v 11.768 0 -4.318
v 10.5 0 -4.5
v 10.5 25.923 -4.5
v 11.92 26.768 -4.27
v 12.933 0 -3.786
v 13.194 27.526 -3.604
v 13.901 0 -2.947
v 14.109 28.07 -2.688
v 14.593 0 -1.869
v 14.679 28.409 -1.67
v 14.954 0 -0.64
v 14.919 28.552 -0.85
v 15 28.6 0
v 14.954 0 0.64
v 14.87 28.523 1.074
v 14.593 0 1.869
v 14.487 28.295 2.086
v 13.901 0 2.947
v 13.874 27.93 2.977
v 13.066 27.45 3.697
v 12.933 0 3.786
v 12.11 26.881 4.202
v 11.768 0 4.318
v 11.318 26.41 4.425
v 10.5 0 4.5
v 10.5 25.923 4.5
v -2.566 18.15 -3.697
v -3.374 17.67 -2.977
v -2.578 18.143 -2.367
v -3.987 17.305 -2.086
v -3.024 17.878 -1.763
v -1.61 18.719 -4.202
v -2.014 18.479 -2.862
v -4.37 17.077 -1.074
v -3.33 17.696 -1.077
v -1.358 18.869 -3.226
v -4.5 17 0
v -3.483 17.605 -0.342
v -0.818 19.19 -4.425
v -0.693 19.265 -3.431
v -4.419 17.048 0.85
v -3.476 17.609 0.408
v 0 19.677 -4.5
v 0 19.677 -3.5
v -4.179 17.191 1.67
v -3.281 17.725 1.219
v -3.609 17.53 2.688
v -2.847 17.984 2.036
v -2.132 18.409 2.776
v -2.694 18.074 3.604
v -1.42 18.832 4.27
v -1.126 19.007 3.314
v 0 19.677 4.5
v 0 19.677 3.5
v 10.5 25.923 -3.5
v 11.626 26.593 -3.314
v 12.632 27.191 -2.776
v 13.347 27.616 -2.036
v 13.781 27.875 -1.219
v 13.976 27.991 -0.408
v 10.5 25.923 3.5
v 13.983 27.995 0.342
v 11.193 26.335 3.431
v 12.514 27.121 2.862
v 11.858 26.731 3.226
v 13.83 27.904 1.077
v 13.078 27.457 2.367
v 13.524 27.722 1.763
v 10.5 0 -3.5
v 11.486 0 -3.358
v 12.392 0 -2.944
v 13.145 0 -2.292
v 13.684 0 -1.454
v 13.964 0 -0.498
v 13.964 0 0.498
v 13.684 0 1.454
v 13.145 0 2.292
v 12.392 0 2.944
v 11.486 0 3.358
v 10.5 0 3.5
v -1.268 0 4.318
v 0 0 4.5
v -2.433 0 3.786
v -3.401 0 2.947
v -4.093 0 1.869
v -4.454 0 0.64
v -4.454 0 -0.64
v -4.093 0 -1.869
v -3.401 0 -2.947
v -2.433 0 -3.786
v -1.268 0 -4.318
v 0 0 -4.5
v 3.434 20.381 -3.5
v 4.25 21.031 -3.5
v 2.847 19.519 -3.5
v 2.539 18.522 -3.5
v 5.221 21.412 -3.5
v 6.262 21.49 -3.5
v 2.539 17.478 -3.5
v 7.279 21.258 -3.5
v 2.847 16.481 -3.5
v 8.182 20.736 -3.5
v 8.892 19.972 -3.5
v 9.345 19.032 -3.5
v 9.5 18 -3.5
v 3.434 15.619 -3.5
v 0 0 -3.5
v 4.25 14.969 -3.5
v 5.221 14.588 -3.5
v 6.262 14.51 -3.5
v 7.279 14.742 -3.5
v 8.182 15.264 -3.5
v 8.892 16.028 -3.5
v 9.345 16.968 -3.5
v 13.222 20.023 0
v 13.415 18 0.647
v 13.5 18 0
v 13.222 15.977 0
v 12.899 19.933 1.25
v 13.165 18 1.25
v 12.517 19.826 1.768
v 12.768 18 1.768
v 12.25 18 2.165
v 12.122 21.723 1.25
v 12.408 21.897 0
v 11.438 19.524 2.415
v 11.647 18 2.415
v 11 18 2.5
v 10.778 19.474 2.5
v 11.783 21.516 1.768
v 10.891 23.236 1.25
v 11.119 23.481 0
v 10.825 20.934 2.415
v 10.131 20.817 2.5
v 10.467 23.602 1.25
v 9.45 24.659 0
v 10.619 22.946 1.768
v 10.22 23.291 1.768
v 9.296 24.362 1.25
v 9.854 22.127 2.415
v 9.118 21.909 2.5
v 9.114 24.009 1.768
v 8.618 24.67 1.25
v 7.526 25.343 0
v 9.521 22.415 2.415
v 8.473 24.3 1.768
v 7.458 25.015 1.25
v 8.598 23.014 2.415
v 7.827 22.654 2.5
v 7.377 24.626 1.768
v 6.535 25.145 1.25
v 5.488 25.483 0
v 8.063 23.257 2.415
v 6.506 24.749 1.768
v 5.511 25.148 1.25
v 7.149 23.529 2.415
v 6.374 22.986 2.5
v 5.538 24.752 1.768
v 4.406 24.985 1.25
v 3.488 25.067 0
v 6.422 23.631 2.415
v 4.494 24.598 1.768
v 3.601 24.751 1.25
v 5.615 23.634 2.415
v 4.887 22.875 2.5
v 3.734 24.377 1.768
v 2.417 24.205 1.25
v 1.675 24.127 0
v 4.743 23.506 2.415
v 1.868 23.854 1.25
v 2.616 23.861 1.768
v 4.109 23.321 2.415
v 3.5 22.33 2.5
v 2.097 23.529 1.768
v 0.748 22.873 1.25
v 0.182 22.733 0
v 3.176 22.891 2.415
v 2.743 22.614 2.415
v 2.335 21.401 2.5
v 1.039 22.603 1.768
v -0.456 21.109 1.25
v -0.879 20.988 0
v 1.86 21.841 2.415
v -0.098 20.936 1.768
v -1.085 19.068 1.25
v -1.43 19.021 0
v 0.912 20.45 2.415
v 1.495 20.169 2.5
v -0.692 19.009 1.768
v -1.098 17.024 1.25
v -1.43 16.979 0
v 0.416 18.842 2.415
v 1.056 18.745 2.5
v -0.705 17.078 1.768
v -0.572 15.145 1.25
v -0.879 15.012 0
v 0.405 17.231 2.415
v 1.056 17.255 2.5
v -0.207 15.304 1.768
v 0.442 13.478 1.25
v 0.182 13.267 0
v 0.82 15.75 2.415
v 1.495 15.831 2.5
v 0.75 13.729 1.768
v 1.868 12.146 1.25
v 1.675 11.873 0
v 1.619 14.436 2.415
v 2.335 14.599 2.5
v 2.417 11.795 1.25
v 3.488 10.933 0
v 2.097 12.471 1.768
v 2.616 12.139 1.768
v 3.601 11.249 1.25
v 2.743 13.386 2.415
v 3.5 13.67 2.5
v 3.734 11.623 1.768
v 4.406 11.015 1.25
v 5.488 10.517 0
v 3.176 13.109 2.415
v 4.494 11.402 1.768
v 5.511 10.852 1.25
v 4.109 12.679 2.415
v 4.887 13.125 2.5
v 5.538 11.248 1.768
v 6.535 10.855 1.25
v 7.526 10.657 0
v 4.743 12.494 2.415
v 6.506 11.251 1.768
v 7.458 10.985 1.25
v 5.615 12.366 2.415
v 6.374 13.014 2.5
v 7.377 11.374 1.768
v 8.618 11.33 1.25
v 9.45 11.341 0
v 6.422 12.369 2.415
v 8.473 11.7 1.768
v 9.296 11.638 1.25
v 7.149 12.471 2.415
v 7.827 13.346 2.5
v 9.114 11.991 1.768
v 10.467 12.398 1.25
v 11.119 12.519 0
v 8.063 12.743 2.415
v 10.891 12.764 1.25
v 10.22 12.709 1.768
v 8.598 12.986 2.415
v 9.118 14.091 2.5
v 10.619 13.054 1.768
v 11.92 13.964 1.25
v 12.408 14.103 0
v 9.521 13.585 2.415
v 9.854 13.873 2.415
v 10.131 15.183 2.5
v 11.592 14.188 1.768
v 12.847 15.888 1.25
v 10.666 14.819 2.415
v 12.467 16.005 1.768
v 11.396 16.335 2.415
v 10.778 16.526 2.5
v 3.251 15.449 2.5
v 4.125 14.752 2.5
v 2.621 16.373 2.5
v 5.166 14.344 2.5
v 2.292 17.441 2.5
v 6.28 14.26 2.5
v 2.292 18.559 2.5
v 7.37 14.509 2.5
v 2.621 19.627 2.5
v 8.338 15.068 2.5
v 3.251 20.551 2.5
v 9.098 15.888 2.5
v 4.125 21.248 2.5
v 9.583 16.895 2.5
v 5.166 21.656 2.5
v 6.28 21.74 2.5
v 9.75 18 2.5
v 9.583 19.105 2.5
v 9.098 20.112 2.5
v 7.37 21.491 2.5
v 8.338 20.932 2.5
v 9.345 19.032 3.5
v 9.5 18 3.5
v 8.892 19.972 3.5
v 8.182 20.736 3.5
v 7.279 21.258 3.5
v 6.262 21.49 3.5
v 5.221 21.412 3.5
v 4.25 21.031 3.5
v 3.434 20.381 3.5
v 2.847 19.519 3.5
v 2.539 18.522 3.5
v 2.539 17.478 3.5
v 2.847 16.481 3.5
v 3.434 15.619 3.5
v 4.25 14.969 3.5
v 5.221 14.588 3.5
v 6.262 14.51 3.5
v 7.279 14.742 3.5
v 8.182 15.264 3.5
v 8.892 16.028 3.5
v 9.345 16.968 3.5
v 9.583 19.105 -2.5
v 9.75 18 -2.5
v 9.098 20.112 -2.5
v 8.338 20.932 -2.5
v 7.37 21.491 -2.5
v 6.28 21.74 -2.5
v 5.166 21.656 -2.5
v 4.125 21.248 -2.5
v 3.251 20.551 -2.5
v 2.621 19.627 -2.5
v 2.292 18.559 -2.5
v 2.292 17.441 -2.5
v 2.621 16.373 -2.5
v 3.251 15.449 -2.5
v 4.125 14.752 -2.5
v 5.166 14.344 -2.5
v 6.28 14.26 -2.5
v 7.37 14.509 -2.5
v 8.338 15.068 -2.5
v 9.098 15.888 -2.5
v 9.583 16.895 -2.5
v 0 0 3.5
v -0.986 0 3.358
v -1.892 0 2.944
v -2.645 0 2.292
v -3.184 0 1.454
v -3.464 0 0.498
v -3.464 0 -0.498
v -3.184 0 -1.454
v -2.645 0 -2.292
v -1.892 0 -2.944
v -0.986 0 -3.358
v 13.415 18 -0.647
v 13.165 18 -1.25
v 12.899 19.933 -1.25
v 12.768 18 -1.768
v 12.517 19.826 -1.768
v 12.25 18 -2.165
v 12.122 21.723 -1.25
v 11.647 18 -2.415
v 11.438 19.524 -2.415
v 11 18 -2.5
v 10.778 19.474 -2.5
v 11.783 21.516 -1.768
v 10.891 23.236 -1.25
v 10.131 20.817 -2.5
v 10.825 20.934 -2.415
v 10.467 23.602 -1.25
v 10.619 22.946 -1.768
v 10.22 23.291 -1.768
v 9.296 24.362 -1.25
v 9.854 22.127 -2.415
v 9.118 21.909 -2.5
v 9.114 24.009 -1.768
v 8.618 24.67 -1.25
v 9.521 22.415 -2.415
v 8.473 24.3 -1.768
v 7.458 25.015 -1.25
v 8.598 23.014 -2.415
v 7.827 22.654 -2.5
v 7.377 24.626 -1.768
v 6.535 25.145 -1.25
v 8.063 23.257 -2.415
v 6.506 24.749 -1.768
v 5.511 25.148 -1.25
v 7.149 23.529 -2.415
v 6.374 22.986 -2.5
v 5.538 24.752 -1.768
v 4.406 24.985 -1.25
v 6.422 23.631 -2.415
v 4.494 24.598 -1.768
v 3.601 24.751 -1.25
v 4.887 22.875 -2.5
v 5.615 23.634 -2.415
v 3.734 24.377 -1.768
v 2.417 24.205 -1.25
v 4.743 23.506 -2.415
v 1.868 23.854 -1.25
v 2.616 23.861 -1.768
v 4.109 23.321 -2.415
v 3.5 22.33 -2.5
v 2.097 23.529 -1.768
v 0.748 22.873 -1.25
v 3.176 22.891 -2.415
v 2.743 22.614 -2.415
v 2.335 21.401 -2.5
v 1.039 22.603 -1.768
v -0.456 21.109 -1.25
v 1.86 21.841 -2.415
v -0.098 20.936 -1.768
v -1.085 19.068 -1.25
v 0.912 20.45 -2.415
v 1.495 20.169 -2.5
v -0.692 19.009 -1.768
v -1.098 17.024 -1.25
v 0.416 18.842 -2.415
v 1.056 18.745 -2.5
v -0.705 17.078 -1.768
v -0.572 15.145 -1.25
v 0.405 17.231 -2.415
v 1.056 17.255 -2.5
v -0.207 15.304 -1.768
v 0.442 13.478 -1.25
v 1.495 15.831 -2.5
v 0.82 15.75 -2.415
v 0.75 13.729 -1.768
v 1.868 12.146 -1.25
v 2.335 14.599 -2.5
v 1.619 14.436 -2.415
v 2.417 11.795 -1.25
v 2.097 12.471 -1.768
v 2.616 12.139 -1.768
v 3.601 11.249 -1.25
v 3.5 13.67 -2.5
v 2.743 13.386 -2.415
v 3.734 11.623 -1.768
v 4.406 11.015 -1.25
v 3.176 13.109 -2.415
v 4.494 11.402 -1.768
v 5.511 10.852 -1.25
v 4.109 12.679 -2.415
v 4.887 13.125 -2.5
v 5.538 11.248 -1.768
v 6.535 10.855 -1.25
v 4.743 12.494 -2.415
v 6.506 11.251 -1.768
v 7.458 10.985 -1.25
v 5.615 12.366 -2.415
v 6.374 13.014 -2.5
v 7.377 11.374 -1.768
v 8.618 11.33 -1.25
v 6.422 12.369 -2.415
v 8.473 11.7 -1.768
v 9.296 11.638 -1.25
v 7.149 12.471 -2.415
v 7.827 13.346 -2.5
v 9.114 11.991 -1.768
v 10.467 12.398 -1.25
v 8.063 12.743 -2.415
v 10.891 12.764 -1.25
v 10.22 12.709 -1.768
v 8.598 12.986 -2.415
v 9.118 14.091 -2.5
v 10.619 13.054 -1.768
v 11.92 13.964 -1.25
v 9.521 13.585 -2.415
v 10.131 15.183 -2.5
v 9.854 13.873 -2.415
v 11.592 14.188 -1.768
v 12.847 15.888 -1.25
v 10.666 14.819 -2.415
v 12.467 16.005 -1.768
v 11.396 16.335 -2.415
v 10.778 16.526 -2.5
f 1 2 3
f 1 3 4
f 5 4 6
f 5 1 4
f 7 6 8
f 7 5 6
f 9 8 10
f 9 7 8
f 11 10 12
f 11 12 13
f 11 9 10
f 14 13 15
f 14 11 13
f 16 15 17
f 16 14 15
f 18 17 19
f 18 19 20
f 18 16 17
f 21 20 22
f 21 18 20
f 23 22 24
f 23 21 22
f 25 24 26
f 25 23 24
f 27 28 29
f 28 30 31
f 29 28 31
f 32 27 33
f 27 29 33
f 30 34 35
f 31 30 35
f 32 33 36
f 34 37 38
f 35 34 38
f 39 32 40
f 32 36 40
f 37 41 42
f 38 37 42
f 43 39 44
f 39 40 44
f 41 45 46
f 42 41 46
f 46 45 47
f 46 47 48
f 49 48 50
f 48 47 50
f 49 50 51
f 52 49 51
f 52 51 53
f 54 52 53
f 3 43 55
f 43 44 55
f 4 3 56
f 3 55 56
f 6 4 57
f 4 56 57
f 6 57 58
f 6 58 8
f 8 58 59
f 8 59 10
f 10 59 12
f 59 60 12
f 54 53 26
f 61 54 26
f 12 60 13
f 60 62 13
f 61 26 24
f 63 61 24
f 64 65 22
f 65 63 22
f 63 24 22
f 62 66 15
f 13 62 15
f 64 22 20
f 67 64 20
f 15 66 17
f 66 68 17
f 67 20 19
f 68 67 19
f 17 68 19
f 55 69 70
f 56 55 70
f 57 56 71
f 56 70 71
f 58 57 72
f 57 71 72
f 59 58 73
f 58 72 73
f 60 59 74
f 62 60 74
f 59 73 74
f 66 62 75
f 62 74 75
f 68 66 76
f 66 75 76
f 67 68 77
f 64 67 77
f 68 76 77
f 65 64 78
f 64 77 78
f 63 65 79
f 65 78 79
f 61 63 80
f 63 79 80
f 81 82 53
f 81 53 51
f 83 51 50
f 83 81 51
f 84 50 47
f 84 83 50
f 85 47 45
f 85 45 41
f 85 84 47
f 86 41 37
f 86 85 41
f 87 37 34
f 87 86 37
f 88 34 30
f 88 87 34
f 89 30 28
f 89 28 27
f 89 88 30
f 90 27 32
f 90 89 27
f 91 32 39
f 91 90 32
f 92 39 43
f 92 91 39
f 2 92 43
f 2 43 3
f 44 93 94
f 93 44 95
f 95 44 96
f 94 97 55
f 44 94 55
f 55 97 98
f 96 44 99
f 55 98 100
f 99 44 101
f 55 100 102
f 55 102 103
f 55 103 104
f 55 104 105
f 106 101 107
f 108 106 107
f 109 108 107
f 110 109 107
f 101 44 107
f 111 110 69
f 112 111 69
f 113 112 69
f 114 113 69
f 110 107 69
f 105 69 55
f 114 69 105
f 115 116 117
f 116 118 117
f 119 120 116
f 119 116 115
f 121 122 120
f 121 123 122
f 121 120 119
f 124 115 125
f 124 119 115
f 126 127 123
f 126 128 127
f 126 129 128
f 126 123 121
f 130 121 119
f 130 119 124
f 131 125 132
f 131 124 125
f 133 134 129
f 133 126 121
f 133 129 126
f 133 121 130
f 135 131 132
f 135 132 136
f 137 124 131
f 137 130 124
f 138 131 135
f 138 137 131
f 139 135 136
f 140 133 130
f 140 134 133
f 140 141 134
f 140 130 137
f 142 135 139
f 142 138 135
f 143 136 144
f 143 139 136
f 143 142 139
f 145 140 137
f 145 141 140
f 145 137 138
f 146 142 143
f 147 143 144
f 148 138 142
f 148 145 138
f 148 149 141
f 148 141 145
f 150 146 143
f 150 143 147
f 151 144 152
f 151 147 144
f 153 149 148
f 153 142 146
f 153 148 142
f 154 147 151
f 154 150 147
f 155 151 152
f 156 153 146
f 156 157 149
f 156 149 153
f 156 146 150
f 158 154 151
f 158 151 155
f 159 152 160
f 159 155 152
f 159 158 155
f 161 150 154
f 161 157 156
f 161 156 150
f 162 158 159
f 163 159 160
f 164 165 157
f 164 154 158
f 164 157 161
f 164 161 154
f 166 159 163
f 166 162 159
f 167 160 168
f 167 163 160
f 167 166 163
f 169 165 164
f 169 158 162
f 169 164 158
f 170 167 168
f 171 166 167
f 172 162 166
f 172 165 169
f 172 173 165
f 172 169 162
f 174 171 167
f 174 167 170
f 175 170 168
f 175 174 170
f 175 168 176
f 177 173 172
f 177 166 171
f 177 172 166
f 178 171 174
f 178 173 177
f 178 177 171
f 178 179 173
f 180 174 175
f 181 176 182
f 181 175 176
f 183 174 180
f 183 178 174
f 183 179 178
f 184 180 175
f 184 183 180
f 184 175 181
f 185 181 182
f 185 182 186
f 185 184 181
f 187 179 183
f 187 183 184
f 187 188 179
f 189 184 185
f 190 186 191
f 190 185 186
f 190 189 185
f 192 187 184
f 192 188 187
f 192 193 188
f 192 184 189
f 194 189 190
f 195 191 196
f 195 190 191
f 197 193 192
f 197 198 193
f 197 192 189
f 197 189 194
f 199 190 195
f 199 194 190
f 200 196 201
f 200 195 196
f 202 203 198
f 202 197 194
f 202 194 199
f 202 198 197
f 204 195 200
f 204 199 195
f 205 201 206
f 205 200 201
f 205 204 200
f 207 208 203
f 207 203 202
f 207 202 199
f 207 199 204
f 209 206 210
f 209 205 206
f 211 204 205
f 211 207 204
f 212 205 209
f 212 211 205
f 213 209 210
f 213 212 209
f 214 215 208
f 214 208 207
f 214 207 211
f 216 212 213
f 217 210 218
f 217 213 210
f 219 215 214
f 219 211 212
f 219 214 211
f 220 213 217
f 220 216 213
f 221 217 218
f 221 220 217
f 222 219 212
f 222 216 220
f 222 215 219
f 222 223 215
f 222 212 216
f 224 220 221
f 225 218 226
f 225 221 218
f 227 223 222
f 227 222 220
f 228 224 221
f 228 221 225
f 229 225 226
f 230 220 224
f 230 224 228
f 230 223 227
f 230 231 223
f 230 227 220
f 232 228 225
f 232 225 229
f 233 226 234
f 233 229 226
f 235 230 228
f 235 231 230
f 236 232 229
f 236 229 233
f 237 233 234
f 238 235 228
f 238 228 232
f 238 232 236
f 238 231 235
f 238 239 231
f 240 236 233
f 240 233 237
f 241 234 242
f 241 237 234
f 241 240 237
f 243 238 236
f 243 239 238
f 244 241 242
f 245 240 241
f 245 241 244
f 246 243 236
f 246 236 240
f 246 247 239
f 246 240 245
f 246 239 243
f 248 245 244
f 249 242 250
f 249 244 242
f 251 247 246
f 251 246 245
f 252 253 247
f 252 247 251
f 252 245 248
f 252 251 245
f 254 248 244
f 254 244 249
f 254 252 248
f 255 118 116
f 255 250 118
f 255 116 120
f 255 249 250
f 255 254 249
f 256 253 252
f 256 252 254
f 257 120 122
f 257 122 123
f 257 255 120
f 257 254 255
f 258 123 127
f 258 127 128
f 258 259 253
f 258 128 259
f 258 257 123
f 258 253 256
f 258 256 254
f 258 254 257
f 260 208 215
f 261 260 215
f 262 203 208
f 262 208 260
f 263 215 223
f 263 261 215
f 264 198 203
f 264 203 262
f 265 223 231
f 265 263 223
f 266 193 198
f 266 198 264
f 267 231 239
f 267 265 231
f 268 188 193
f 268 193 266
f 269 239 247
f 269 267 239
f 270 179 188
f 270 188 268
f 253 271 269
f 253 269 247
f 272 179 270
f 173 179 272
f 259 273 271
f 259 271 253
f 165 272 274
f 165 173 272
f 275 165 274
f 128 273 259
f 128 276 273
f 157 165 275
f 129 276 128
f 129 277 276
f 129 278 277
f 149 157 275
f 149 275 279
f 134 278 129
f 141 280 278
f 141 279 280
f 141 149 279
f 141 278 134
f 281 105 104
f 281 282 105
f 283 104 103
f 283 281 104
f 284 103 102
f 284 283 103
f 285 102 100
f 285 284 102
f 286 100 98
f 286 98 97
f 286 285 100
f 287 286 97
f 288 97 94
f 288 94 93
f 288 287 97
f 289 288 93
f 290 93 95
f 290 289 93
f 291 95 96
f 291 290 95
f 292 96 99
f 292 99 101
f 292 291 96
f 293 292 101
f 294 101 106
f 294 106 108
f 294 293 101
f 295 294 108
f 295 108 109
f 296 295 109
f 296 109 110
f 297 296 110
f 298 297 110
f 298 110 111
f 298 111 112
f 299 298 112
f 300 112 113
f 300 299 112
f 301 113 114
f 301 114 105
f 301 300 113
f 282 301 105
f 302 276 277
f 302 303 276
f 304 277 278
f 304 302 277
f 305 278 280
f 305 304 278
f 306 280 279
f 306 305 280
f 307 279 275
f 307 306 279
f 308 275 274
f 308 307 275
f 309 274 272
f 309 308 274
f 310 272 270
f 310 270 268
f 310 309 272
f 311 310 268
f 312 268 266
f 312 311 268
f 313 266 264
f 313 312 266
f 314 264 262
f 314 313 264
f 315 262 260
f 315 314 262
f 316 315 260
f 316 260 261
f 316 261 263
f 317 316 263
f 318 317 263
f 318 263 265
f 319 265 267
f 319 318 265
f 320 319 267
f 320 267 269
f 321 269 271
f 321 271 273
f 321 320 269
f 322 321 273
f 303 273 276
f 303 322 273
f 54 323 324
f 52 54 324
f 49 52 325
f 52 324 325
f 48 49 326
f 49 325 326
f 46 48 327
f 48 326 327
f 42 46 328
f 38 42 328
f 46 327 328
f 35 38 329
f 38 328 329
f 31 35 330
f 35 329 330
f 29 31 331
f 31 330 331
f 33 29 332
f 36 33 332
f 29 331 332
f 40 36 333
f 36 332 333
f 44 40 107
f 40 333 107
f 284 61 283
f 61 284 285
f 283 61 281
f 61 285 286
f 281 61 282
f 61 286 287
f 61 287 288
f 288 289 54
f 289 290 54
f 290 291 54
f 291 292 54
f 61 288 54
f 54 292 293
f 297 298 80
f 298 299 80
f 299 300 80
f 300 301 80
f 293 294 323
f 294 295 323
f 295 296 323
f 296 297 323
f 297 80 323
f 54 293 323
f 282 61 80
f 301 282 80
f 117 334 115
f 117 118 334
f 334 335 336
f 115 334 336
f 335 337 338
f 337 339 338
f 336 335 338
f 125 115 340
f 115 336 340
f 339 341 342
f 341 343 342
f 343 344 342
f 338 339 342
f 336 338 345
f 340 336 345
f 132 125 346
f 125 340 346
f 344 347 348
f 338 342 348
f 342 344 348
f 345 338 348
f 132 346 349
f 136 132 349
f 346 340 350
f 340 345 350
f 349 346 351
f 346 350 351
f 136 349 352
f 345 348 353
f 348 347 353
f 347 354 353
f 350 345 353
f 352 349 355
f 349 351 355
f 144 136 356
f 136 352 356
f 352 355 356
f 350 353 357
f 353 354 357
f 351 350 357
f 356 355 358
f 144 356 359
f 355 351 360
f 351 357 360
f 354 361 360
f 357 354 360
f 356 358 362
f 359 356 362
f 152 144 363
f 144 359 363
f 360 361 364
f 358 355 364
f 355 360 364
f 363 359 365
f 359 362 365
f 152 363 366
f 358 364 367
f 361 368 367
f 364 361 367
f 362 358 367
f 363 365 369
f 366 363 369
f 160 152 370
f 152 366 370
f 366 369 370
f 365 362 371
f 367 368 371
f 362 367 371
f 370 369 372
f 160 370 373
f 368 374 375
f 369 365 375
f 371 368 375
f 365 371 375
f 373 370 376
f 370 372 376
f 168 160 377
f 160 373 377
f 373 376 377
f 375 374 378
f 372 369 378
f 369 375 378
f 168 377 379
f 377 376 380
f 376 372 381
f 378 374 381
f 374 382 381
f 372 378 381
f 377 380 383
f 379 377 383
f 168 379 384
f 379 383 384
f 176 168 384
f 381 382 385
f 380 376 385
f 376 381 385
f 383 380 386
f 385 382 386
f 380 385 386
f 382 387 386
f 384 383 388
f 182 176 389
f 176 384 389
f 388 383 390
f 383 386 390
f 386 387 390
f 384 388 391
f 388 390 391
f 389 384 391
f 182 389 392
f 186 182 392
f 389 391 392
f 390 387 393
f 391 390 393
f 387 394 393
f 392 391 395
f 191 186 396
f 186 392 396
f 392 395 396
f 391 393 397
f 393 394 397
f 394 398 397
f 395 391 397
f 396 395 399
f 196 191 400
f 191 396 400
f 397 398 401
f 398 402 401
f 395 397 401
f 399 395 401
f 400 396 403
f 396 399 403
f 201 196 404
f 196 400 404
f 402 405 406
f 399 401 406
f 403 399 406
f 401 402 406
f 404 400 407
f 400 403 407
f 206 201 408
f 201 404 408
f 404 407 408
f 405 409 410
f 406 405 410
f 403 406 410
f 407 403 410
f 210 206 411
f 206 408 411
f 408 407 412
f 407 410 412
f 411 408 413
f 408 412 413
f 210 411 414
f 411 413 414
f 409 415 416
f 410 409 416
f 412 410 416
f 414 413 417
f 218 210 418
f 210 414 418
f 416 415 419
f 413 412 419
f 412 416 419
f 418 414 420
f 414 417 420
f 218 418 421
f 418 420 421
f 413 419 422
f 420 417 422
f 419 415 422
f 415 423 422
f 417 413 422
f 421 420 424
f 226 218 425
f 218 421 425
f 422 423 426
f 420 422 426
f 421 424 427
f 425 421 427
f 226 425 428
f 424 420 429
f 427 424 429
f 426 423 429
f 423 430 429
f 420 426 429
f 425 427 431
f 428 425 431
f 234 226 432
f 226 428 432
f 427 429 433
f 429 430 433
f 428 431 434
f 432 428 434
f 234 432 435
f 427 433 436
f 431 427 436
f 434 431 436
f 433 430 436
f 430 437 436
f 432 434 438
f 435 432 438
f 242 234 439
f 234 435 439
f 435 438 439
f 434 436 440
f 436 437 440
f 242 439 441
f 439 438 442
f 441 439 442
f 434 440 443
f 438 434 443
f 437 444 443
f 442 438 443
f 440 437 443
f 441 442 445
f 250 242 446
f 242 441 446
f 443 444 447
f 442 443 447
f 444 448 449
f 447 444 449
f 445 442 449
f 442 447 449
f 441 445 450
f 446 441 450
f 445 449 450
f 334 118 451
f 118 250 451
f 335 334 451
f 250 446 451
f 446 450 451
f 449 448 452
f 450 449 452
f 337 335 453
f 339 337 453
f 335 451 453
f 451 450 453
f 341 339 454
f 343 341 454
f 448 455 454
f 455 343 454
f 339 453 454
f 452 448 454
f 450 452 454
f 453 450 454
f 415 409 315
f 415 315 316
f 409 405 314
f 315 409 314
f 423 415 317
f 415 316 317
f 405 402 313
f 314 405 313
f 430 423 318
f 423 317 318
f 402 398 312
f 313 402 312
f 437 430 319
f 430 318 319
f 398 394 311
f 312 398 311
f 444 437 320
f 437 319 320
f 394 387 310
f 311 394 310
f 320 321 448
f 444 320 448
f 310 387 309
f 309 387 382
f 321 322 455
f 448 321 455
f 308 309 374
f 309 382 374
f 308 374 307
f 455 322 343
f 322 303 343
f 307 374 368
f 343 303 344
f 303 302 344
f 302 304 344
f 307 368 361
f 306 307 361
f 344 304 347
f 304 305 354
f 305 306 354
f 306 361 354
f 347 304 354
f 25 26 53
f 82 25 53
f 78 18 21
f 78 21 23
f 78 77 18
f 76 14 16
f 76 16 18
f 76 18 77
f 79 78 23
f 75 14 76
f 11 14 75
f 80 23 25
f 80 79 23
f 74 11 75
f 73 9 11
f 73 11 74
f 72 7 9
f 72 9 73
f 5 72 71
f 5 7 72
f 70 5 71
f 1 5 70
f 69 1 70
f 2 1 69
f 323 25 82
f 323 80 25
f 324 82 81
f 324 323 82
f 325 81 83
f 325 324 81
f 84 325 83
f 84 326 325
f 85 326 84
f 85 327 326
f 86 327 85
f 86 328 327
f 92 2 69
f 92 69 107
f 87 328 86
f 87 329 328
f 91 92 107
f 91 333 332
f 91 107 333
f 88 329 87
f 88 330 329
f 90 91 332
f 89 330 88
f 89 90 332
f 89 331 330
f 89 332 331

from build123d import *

# Parameters (mm, degrees)
EXTRUDE_1_DEPTH     = 30
CUT_EXTRUDE_1_DEPTH = 5
SKETCH_3_R          = 3.5
EXTRUDE_1_2_DEPTH   = 3.5
SKETCH_4_R          = 7.5
SKETCH_4_R_2        = 3.75
EXTRUDE_2_DEPTH     = 2.5
FILLET_2_R          = 2.5


with BuildPart() as part:
    # 草图1 → Extrude 1 (new body)
    with BuildSketch(Plane(origin=(0, 0, 0), x_dir=(1, 0, 0), z_dir=(0, 1, 0))):
        with BuildLine():
            Line((10.5, -4.5), (0, -4.5))
            ThreePointArc((0, -4.5), (-4.5, 0), (0, 4.5))
            Line((0, 4.5), (10.5, 4.5))
            ThreePointArc((10.5, 4.5), (15, 0), (10.5, -4.5))
        make_face()
        with BuildLine():
            Line((10.5, -3.5), (0, -3.5))
            ThreePointArc((0, -3.5), (-3.5, 0), (0, 3.5))
            Line((0, 3.5), (10.5, 3.5))
            ThreePointArc((10.5, 3.5), (14, 0), (10.5, -3.5))
        make_face(mode=Mode.SUBTRACT)
    extrude(amount=EXTRUDE_1_DEPTH)

    # 草图2 → 切除-拉伸1 (cut, symmetric)
    with BuildSketch(Plane.XY):
        Polygon((-4.5, 17), (15, 28.6), (15, 30), (-4.5, 30), align=None)
    extrude(amount=CUT_EXTRUDE_1_DEPTH, both=True, mode=Mode.SUBTRACT)

    # 草图3 → Extrude 1 2 (add, symmetric)
    with BuildSketch(Plane.XY):
        with Locations((6, 18)):
            Circle(SKETCH_3_R)
    extrude(amount=EXTRUDE_1_2_DEPTH, both=True)


with BuildPart() as body_2:
    # 草图4 → 凸台-拉伸2 (new, symmetric)
    with BuildSketch(Plane.XY):
        with Locations((6, 18)):
            Circle(SKETCH_4_R)
        with Locations((6, 18)):
            Circle(SKETCH_4_R_2, mode=Mode.SUBTRACT)
    extrude(amount=EXTRUDE_2_DEPTH, both=True)

    # 圆角2
    fillet_2_edges = [body_2.edges().sort_by_distance(p)[0] for p in [
        (-1.5, 18, 2.5),
        (-1.5, 18, -2.5),
    ]]
    fillet(fillet_2_edges, radius=FILLET_2_R - 0.0001)  # a hair under: the kernel refuses the full size


solid = Compound([part.part, body_2.part])
